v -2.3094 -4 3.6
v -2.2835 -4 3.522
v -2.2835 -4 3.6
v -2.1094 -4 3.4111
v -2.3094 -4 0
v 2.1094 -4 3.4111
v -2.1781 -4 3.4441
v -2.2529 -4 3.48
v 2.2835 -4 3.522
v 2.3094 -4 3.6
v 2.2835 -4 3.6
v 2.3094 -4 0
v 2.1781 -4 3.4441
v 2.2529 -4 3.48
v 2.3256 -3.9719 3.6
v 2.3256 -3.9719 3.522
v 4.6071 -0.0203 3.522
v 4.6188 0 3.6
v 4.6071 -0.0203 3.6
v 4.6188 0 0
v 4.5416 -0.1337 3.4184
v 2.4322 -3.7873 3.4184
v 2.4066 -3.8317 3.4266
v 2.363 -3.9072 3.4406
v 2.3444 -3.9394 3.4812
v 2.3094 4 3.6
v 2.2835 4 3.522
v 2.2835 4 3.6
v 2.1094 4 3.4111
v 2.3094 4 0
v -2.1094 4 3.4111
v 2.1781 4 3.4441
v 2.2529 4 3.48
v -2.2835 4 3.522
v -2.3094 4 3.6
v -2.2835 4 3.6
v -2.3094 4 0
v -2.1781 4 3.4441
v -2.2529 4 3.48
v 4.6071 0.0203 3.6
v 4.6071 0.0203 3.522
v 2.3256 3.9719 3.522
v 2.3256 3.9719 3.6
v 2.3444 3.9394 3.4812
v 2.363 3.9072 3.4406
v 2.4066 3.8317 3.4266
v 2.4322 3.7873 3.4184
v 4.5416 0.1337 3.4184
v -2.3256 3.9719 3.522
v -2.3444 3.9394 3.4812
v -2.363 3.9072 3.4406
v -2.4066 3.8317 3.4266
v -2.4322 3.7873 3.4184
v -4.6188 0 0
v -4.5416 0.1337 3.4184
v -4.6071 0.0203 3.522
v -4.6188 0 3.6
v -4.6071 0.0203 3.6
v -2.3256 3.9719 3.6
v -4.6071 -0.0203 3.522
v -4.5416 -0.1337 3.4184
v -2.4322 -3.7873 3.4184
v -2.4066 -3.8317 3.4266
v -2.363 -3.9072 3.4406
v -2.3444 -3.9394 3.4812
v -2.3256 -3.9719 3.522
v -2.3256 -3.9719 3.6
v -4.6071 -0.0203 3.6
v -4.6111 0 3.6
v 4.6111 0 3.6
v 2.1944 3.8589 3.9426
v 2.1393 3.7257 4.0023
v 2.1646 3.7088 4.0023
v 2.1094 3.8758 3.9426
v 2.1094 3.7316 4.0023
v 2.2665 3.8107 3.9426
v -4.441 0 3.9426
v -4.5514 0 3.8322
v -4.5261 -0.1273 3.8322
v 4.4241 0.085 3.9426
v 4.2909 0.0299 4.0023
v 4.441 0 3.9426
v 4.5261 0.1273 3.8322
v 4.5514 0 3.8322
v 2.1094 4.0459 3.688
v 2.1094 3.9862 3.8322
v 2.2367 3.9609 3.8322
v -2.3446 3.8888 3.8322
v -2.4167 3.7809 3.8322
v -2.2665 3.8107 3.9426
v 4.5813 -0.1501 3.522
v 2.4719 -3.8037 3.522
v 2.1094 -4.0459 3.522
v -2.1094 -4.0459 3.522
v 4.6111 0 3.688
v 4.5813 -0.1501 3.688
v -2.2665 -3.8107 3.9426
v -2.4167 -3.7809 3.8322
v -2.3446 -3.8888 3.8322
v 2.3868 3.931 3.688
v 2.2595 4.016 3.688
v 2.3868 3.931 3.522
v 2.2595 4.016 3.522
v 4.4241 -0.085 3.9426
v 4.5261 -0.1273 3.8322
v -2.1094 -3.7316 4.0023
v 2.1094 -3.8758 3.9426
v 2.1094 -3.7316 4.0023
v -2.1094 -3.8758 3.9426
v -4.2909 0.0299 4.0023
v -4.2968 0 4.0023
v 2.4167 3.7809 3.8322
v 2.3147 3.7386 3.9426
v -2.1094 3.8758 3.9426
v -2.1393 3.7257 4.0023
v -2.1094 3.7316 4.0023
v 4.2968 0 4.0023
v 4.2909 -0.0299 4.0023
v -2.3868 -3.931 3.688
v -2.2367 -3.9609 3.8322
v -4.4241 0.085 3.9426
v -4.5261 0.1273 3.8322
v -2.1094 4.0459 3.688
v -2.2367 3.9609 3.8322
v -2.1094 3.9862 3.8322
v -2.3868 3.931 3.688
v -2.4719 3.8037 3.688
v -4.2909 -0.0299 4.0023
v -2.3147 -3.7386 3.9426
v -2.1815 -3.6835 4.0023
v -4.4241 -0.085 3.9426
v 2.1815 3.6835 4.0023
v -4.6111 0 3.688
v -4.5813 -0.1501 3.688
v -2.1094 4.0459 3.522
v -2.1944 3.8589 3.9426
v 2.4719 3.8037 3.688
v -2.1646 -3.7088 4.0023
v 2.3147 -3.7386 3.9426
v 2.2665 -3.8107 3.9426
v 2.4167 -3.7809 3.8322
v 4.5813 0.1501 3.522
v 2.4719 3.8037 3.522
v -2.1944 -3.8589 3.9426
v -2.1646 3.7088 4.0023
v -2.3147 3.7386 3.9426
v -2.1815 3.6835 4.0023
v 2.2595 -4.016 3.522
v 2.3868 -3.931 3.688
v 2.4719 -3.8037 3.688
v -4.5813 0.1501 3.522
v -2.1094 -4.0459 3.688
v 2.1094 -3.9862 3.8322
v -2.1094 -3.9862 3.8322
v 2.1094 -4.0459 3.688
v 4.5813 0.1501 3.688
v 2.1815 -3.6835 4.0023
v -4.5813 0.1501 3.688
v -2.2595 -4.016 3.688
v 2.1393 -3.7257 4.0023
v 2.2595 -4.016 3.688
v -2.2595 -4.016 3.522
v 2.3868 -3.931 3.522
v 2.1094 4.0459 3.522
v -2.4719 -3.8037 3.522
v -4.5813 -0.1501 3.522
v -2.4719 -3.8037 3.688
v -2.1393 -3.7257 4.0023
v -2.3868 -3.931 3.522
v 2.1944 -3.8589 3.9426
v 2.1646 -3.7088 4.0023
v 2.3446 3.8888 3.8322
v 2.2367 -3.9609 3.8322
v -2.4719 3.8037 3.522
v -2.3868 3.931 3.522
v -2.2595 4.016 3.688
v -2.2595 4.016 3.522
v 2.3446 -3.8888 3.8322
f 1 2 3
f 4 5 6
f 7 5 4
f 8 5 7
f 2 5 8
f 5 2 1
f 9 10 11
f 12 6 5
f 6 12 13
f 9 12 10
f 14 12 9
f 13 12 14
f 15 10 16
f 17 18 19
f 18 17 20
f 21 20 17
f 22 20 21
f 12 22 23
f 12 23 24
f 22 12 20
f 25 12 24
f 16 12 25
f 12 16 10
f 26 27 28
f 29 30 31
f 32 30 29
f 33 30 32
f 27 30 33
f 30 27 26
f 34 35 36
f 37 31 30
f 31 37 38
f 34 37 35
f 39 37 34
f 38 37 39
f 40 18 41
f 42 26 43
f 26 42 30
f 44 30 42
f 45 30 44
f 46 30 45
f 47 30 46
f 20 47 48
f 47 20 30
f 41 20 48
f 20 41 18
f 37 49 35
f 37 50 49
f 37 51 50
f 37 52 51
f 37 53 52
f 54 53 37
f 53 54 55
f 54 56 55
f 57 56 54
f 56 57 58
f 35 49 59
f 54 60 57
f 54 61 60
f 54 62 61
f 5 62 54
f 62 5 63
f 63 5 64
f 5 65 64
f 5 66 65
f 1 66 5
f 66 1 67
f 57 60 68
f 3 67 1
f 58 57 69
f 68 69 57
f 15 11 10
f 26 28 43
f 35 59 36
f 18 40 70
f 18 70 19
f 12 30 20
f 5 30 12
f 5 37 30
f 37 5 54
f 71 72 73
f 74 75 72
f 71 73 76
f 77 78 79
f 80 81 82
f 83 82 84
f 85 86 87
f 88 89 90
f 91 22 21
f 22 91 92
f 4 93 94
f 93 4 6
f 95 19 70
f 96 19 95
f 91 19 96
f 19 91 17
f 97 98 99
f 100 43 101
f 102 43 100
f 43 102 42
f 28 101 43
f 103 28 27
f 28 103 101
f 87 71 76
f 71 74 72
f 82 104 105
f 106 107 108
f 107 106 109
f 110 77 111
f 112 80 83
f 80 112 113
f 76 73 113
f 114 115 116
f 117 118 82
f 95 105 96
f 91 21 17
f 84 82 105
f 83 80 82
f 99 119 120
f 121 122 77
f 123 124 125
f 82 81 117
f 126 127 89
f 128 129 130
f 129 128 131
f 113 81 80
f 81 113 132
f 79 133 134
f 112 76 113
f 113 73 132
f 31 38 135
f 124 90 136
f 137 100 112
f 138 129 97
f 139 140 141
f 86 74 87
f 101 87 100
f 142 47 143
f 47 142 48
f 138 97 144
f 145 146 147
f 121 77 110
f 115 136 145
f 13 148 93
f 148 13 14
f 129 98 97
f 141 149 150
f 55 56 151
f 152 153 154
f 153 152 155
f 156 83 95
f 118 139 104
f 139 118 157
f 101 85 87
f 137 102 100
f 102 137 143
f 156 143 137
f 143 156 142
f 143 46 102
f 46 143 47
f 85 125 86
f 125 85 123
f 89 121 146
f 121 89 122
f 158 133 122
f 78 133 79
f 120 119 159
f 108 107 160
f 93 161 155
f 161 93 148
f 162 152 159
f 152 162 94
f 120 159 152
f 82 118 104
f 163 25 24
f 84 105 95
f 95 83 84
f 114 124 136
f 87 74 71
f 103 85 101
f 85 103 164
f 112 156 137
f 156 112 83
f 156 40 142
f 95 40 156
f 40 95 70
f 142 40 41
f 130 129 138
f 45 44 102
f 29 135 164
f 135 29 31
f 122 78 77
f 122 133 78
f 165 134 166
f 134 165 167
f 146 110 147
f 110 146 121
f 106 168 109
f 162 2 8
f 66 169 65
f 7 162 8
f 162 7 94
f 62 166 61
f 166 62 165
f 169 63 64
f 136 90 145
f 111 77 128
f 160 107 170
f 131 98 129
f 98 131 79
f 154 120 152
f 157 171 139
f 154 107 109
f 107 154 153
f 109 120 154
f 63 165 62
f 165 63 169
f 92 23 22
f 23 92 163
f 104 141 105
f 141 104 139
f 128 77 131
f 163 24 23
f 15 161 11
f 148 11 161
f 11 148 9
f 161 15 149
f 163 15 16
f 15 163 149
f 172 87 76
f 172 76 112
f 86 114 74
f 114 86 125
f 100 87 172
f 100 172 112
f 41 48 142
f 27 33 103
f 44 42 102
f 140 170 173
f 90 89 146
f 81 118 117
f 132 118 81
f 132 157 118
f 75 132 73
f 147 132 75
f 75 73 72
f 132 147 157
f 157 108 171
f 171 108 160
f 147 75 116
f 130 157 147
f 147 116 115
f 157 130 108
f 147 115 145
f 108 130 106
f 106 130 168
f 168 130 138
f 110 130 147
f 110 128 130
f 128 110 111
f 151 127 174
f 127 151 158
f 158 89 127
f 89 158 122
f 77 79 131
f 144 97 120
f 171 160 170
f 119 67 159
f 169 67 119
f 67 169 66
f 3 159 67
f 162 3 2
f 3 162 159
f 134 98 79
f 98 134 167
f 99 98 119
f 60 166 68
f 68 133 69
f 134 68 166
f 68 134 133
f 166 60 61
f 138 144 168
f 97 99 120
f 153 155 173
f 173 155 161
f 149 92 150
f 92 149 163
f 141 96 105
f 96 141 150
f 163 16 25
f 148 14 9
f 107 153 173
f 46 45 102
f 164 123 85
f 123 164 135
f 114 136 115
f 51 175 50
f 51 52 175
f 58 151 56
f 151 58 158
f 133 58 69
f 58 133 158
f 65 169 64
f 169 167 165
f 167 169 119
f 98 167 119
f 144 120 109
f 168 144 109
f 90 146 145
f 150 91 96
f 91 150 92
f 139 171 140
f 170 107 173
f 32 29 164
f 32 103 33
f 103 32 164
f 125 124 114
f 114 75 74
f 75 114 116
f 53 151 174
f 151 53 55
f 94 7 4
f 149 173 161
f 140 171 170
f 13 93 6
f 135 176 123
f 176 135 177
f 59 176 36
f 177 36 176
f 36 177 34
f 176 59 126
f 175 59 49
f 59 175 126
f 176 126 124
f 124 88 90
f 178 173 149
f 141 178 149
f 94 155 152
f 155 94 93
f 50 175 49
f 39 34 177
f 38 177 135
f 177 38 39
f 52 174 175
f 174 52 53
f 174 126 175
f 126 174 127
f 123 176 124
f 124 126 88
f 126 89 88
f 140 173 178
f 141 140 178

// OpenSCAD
// studs/hex_bolt.scad — hex head, like a real bolt sticking up.
// MIT licensed.
//
// Industrial set. The hex shape is achieved via cylinder($fn=6); tip_radius
// chamfers the top edge.

module stud_hex_bolt(size = 6, tip_radius = 0.4, height = undef) {
    h = is_undef(height) ? size * 0.5 : height;

    // Hex head: cylinder with 6 facets, sized so the flat-to-flat distance
    // equals `size`.
    r = size / sqrt(3);  // outer radius for flat-to-flat = size

    if (tip_radius > 0) {
        // Chamfer the top edge by minkowski-summing the top portion with a
        // small sphere. Keeps the bottom crisp where it meets the band.
        union() {
            cylinder(h = h - tip_radius, r = r, $fn = 6);
            translate([0, 0, h - tip_radius])
                minkowski() {
                    cylinder(h = 0.01, r = r - tip_radius, $fn = 6);
                    sphere(r = tip_radius, $fn = 16);
                }
        }
    } else {
        cylinder(h = h, r = r, $fn = 6);
    }
}

stud_hex_bolt(size = 8, tip_radius = 0.4);
